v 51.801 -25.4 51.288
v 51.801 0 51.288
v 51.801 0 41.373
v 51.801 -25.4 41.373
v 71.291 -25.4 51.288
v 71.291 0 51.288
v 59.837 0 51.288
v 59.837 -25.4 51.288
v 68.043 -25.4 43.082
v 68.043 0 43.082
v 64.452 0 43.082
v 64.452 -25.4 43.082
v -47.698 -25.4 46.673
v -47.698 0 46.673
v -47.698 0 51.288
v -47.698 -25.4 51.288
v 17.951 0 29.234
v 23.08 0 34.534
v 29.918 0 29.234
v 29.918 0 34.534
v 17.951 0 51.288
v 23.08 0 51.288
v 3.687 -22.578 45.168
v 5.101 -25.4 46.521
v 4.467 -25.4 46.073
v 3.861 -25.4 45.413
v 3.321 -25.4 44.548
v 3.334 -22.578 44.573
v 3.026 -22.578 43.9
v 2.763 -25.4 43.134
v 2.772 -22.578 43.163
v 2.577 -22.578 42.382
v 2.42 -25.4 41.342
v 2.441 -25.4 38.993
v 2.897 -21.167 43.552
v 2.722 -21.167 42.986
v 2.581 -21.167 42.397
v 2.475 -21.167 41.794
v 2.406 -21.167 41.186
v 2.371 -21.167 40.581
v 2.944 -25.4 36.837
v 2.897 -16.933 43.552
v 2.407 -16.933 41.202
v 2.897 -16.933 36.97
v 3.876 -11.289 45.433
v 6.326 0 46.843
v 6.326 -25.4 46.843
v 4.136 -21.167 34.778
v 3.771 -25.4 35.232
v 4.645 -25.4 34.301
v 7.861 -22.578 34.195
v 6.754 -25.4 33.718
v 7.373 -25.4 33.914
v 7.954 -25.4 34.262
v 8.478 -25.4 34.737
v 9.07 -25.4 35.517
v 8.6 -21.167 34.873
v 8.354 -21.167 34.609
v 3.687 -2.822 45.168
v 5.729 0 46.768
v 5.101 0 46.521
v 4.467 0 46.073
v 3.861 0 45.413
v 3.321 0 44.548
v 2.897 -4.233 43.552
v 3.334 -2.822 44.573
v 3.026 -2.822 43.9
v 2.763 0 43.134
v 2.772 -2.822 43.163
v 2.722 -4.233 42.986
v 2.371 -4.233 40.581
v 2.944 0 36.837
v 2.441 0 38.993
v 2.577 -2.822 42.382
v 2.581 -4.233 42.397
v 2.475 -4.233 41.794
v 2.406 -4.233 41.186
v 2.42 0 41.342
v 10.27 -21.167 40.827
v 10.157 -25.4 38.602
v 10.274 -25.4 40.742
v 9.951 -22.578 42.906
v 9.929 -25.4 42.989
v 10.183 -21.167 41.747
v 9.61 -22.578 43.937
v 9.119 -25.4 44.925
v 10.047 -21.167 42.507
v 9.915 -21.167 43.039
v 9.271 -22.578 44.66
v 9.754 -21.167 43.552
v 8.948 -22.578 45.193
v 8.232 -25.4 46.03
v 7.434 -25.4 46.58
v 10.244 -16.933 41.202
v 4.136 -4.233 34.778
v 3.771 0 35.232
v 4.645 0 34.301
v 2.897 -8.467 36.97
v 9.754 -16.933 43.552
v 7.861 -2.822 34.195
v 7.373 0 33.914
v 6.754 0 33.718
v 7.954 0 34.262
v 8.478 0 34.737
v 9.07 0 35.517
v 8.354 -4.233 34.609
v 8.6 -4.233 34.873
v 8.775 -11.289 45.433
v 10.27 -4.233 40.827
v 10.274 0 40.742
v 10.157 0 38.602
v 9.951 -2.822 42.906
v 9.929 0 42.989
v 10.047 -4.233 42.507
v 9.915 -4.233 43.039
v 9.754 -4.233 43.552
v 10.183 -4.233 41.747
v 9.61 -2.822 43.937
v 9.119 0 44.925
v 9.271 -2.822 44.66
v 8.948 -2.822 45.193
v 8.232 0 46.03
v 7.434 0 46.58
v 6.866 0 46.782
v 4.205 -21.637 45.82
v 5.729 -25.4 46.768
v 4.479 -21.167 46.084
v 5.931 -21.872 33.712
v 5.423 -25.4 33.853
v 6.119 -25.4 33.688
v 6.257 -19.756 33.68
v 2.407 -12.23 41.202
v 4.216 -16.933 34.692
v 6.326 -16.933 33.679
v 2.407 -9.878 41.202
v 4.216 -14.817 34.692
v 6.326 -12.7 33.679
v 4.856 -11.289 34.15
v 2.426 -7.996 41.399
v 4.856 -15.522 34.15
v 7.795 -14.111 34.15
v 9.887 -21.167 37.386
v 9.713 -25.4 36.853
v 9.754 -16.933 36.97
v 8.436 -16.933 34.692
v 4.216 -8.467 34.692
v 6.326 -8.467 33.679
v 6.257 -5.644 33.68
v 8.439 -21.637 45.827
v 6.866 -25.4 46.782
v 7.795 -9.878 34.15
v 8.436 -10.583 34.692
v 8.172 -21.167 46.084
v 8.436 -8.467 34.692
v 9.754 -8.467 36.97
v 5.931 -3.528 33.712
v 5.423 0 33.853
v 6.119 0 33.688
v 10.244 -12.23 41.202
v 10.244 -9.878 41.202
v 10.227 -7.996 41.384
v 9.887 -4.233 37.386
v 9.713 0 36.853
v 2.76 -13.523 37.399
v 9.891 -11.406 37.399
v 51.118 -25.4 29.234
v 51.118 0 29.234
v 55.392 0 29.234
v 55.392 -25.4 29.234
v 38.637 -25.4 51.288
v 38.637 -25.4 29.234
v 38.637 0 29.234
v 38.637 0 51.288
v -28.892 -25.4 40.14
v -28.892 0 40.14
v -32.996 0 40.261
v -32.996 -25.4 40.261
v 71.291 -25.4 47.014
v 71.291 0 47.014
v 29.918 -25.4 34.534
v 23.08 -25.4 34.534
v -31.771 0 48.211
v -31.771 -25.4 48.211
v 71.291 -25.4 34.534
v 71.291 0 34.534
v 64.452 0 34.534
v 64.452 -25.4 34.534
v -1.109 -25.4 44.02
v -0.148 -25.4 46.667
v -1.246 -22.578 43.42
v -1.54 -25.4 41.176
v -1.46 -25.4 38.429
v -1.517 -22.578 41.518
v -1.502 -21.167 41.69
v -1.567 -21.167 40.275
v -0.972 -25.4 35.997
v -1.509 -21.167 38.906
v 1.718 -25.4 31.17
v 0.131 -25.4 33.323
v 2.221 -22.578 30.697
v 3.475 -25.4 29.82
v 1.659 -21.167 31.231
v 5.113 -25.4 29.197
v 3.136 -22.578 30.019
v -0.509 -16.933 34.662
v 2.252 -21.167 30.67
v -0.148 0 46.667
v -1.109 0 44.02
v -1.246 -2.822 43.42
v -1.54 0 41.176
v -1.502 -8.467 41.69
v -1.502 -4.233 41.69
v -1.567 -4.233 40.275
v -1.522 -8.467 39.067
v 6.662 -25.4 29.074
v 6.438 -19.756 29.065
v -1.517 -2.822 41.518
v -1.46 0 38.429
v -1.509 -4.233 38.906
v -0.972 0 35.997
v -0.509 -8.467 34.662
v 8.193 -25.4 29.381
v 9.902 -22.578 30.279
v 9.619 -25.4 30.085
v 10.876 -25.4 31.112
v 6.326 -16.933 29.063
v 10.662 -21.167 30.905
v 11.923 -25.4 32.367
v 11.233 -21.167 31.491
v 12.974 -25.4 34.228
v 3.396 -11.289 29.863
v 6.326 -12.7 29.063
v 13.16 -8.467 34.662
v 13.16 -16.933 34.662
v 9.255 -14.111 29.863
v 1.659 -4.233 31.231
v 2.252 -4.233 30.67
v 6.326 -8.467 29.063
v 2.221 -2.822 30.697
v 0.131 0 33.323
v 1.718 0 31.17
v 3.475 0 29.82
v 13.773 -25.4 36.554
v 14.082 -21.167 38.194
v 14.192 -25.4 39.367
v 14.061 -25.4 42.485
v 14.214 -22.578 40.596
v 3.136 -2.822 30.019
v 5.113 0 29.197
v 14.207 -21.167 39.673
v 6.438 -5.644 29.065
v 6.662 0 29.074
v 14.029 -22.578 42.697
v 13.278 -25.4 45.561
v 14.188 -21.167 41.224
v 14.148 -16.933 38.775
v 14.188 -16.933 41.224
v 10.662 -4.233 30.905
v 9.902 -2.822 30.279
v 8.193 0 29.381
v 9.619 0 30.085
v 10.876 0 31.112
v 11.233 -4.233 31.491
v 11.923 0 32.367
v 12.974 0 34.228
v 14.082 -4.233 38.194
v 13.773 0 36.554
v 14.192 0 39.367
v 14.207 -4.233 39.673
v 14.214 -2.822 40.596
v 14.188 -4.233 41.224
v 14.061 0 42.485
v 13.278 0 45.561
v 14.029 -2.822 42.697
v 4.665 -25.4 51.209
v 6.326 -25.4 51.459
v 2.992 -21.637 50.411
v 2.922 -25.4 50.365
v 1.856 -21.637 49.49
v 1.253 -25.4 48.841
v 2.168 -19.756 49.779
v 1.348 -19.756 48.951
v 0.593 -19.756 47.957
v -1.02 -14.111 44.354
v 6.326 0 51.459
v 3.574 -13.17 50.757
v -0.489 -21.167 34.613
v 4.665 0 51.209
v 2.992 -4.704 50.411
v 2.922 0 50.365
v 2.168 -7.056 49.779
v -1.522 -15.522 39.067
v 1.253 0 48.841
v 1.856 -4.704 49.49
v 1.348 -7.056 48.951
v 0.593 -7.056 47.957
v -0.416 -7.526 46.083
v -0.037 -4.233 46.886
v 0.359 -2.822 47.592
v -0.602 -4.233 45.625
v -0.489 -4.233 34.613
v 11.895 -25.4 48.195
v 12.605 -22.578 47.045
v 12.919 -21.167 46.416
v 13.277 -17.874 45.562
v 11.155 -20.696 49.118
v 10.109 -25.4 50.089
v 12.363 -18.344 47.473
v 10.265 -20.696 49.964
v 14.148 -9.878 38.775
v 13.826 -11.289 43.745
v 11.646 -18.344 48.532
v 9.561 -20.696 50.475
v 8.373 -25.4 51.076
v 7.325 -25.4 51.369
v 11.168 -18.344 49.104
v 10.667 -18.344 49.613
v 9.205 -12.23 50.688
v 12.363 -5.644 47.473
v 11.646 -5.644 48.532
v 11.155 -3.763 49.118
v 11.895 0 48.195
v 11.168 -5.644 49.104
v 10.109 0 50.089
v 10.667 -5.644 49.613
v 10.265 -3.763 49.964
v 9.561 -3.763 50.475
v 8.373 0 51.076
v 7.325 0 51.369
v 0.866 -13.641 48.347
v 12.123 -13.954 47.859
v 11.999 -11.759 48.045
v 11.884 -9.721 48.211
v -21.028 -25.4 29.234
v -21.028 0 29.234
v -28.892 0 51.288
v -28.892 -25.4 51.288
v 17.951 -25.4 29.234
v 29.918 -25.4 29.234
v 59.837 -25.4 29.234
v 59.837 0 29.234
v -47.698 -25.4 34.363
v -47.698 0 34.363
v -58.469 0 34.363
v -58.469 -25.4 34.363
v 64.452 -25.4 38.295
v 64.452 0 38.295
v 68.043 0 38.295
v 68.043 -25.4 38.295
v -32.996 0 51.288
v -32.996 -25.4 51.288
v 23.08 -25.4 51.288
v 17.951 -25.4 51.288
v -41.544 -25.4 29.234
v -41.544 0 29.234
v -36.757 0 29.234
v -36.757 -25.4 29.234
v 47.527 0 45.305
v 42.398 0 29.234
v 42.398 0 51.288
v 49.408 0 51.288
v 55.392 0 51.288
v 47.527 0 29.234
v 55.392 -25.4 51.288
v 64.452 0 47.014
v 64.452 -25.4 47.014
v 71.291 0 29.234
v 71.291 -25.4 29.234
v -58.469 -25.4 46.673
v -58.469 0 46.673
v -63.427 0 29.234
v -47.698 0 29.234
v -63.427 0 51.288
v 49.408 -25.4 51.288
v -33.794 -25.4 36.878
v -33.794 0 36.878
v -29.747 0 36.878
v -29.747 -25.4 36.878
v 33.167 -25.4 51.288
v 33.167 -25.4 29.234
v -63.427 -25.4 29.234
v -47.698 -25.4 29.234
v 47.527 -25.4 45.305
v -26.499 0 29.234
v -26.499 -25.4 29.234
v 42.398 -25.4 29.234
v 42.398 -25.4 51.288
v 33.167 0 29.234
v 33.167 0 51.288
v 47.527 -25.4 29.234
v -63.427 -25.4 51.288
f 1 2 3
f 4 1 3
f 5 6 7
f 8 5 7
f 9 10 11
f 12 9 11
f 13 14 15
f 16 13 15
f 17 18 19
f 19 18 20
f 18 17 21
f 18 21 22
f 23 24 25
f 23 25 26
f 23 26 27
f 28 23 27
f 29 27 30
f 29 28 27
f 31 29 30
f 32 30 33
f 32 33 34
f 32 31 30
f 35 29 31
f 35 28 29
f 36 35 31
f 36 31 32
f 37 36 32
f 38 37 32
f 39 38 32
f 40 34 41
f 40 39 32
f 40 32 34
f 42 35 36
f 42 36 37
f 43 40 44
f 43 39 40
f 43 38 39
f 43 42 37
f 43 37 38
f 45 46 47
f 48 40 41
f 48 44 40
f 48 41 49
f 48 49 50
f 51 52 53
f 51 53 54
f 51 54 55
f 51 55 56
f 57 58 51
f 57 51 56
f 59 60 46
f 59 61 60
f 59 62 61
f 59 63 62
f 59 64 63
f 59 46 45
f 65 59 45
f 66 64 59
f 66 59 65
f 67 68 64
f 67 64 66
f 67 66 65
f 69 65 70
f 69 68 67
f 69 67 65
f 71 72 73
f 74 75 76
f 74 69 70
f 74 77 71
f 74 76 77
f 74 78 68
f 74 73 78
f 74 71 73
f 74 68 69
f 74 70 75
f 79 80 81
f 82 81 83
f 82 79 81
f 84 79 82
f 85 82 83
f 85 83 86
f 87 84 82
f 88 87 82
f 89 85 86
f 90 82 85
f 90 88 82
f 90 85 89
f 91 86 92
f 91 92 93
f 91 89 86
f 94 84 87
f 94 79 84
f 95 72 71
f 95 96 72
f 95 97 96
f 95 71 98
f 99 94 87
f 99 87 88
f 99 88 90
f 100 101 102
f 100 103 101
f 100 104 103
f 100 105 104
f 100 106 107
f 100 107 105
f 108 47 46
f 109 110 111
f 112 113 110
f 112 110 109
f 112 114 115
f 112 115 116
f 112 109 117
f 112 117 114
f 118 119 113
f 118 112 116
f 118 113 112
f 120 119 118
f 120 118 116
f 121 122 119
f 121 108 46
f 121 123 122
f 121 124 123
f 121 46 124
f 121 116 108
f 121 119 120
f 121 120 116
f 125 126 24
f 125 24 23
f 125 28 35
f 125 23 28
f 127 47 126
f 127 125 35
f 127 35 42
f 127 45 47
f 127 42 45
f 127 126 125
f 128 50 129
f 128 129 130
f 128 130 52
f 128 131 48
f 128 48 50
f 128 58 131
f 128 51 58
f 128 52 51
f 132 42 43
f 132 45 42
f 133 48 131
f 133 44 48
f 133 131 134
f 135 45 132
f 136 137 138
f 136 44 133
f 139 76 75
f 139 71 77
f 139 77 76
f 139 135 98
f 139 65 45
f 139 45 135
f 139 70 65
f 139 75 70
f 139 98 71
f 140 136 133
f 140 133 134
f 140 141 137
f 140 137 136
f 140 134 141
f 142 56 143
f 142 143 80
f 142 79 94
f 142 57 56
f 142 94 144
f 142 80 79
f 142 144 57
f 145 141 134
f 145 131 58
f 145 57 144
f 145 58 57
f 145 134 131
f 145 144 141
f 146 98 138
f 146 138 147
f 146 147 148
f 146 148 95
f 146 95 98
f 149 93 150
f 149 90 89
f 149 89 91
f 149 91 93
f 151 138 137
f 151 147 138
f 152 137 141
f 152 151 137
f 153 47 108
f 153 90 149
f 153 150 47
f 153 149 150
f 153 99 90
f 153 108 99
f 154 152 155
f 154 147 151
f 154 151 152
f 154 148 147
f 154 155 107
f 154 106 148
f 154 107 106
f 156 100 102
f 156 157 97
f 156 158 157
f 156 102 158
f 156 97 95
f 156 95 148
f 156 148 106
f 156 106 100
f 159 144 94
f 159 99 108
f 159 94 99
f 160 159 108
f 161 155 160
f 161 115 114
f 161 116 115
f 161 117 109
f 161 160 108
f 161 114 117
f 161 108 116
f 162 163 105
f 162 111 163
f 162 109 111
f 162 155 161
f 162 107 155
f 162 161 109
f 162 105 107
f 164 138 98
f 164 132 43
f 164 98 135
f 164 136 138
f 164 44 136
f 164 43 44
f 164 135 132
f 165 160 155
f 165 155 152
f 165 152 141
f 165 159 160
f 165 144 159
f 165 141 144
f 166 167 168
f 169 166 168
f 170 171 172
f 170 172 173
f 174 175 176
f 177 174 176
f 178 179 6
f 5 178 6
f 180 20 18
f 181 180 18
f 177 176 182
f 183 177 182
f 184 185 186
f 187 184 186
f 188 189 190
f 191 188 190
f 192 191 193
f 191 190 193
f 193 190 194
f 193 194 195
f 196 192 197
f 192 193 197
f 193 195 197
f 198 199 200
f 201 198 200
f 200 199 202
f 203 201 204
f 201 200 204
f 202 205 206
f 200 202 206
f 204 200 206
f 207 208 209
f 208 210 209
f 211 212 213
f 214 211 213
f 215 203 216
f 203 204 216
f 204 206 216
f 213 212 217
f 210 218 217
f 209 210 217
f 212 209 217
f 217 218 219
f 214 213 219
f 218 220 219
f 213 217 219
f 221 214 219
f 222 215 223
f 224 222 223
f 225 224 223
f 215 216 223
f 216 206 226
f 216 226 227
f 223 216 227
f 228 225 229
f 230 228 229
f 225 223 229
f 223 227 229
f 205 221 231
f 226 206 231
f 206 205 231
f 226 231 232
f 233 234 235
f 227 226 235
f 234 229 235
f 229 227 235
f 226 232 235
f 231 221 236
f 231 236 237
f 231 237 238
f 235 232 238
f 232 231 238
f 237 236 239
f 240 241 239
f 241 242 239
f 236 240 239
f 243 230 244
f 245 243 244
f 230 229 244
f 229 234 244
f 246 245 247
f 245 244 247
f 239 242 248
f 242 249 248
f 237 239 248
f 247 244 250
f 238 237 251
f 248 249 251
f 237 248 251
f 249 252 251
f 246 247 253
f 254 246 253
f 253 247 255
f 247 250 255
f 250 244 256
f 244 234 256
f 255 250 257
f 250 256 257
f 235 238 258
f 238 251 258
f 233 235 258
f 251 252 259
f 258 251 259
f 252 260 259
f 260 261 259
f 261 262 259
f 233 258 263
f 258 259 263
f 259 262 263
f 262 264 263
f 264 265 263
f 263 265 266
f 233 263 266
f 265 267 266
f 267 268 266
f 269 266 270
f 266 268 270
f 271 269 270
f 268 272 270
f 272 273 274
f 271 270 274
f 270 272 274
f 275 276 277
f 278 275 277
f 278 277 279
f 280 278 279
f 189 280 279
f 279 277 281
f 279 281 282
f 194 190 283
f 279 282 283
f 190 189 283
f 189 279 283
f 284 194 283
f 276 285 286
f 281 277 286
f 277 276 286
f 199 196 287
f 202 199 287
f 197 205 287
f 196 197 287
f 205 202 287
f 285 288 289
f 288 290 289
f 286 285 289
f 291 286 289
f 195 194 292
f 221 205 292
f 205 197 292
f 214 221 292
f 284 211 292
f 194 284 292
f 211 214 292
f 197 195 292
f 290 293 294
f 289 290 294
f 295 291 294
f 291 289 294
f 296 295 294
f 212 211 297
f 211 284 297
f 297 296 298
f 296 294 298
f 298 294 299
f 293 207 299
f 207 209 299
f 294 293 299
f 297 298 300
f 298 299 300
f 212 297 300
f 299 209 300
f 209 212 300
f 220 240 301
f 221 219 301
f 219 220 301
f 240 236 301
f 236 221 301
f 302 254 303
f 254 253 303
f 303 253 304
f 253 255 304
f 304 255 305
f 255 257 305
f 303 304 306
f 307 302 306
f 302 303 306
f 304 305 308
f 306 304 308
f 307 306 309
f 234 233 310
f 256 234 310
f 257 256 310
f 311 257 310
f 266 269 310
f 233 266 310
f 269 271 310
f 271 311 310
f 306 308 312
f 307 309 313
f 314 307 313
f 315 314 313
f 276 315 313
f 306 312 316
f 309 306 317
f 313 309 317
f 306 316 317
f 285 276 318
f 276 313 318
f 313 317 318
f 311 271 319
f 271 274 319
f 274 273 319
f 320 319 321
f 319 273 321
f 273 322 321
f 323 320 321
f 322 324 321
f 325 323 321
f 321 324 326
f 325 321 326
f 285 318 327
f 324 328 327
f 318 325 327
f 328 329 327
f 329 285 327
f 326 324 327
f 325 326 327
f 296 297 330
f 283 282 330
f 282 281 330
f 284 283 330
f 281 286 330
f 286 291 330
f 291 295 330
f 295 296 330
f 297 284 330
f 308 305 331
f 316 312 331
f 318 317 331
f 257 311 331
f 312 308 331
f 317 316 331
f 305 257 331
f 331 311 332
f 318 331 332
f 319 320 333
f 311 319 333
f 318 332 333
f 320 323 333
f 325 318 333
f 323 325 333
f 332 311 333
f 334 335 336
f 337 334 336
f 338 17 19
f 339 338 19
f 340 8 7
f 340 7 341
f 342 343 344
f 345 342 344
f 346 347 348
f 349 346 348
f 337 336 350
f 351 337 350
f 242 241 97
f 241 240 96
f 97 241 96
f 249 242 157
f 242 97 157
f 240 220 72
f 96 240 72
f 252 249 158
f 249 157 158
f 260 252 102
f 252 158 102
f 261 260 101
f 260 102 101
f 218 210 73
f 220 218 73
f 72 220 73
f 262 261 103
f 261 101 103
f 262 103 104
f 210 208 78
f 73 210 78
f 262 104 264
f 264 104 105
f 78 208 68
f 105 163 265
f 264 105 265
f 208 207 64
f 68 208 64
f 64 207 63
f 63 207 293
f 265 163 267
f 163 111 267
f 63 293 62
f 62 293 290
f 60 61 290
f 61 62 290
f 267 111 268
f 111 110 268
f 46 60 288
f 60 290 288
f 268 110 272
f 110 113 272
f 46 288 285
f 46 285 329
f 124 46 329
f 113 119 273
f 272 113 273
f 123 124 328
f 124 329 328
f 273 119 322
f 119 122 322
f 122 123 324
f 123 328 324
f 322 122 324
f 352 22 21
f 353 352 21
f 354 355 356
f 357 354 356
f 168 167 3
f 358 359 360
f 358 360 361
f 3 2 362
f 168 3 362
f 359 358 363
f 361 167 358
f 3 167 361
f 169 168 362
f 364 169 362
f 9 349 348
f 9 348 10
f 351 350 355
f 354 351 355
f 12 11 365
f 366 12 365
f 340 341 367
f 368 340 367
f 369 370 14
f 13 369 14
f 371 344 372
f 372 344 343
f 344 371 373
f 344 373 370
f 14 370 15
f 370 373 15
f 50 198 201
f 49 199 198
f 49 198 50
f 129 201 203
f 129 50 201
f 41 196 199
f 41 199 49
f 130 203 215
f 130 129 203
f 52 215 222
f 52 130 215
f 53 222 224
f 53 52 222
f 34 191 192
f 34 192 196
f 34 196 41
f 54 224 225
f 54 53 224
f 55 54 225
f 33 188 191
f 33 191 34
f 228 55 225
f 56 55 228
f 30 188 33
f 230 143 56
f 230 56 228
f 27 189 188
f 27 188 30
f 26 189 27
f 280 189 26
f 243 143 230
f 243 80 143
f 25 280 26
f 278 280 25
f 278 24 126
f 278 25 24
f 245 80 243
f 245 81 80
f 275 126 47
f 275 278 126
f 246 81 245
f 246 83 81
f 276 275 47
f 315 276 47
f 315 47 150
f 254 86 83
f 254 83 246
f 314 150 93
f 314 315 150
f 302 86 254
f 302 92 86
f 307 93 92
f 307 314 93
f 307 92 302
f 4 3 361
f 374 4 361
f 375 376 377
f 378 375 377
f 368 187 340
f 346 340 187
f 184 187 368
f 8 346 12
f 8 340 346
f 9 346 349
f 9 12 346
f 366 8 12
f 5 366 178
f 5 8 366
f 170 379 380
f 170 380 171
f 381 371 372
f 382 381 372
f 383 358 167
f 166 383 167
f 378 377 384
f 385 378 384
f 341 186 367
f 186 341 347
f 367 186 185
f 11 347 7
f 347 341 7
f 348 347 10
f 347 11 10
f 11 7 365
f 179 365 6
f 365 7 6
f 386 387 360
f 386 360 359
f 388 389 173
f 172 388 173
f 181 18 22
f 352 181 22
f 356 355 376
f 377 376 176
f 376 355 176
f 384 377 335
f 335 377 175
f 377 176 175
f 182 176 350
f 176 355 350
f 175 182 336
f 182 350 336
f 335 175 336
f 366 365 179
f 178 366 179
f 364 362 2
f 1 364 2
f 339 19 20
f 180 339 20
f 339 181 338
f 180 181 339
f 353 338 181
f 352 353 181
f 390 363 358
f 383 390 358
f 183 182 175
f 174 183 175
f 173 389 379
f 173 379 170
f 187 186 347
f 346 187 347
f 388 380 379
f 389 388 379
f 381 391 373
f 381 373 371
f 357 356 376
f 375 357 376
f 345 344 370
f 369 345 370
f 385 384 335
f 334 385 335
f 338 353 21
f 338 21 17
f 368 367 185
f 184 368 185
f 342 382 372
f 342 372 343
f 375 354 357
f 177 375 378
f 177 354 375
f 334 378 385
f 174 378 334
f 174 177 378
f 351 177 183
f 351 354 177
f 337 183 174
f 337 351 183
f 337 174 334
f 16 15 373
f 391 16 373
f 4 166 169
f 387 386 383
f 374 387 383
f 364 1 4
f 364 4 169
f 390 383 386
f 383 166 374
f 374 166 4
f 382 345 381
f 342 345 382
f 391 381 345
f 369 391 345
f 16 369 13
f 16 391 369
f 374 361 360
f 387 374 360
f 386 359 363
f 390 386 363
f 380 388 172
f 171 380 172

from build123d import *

# Parameters (mm, degrees)
F0_W     = 5.470771
F0_H     = 22.054041
F1_DEPTH = 25.4


with BuildPart() as f1:
    # F0 (on Front) → F1 (new body)
    with BuildSketch(Plane.XZ):
        Polygon((-47.698271, 46.672501), (-47.698271, 51.288463), (-63.426733, 51.288463), (-63.426733, 29.234422), (-47.698271, 29.234422), (-47.698271, 34.36327), (-58.468845, 34.36327), (-58.468845, 46.672501), align=None)
        Polygon((23.079809, 51.288463), (17.950963, 51.288463), (17.950963, 29.234422), (29.918272, 29.234422), (29.918272, 34.534231), (23.079809, 34.534231), align=None)
        with Locations((35.901924, 40.261443)):
            Rectangle(F0_W, F0_H)
        Polygon((49.407884, 51.288463), (42.398464, 51.288463), (42.398464, 29.234422), (47.52731, 29.234422), (47.52731, 45.304805), (51.117502, 29.234422), (55.391539, 29.234422), (55.391539, 51.288463), (51.801346, 51.288463), (51.801346, 41.372694), align=None)
        Polygon((71.290962, 51.288463), (59.83654, 51.288463), (59.83654, 29.234422), (71.290962, 29.234422), (71.290962, 34.534231), (64.452499, 34.534231), (64.452499, 38.295384), (68.042696, 38.295384), (68.042696, 43.082312), (64.452499, 43.082312), (64.452499, 47.014423), (71.290962, 47.014423), align=None)
        with BuildLine():
            add(Edge.make_bspline(
                [(6.325576, 51.45942), (-7.343948, 51.45942), (-0.509186, 34.662454), (6.325576, 17.865487), (13.160339, 34.662454), (19.995101, 51.45942), (6.325576, 51.45942)],
                knots=[0, 0, 0, 2.094395, 2.094395, 4.18879, 4.18879, 6.283185, 6.283185, 6.283185], degree=2, weights=[1, 0.5, 1, 0.5, 1, 0.5, 1]))
        make_face()
        with BuildLine():
            add(Edge.make_bspline(
                [(6.325576, 46.843462), (-0.532054, 46.843462), (2.896761, 36.970433), (6.325576, 27.097405), (9.754392, 36.970433), (13.183207, 46.843462), (6.325576, 46.843462)],
                knots=[0, 0, 0, 2.094395, 2.094395, 4.18879, 4.18879, 6.283185, 6.283185, 6.283185], degree=2, weights=[1, 0.5, 1, 0.5, 1, 0.5, 1]))
        make_face(mode=Mode.SUBTRACT)
        Polygon((-28.8925, 51.288463), (-32.995578, 51.288463), (-41.543655, 29.234422), (-36.756732, 29.234422), (-33.794089, 36.878041), (-29.747307, 36.878041), (-26.499039, 29.234422), (-21.028269, 29.234422), align=None)
        Polygon((-28.8925, 40.139685), (-32.995578, 40.261443), (-31.770698, 48.211154), align=None, mode=Mode.SUBTRACT)
    extrude(amount=F1_DEPTH)


solid = f1.part
